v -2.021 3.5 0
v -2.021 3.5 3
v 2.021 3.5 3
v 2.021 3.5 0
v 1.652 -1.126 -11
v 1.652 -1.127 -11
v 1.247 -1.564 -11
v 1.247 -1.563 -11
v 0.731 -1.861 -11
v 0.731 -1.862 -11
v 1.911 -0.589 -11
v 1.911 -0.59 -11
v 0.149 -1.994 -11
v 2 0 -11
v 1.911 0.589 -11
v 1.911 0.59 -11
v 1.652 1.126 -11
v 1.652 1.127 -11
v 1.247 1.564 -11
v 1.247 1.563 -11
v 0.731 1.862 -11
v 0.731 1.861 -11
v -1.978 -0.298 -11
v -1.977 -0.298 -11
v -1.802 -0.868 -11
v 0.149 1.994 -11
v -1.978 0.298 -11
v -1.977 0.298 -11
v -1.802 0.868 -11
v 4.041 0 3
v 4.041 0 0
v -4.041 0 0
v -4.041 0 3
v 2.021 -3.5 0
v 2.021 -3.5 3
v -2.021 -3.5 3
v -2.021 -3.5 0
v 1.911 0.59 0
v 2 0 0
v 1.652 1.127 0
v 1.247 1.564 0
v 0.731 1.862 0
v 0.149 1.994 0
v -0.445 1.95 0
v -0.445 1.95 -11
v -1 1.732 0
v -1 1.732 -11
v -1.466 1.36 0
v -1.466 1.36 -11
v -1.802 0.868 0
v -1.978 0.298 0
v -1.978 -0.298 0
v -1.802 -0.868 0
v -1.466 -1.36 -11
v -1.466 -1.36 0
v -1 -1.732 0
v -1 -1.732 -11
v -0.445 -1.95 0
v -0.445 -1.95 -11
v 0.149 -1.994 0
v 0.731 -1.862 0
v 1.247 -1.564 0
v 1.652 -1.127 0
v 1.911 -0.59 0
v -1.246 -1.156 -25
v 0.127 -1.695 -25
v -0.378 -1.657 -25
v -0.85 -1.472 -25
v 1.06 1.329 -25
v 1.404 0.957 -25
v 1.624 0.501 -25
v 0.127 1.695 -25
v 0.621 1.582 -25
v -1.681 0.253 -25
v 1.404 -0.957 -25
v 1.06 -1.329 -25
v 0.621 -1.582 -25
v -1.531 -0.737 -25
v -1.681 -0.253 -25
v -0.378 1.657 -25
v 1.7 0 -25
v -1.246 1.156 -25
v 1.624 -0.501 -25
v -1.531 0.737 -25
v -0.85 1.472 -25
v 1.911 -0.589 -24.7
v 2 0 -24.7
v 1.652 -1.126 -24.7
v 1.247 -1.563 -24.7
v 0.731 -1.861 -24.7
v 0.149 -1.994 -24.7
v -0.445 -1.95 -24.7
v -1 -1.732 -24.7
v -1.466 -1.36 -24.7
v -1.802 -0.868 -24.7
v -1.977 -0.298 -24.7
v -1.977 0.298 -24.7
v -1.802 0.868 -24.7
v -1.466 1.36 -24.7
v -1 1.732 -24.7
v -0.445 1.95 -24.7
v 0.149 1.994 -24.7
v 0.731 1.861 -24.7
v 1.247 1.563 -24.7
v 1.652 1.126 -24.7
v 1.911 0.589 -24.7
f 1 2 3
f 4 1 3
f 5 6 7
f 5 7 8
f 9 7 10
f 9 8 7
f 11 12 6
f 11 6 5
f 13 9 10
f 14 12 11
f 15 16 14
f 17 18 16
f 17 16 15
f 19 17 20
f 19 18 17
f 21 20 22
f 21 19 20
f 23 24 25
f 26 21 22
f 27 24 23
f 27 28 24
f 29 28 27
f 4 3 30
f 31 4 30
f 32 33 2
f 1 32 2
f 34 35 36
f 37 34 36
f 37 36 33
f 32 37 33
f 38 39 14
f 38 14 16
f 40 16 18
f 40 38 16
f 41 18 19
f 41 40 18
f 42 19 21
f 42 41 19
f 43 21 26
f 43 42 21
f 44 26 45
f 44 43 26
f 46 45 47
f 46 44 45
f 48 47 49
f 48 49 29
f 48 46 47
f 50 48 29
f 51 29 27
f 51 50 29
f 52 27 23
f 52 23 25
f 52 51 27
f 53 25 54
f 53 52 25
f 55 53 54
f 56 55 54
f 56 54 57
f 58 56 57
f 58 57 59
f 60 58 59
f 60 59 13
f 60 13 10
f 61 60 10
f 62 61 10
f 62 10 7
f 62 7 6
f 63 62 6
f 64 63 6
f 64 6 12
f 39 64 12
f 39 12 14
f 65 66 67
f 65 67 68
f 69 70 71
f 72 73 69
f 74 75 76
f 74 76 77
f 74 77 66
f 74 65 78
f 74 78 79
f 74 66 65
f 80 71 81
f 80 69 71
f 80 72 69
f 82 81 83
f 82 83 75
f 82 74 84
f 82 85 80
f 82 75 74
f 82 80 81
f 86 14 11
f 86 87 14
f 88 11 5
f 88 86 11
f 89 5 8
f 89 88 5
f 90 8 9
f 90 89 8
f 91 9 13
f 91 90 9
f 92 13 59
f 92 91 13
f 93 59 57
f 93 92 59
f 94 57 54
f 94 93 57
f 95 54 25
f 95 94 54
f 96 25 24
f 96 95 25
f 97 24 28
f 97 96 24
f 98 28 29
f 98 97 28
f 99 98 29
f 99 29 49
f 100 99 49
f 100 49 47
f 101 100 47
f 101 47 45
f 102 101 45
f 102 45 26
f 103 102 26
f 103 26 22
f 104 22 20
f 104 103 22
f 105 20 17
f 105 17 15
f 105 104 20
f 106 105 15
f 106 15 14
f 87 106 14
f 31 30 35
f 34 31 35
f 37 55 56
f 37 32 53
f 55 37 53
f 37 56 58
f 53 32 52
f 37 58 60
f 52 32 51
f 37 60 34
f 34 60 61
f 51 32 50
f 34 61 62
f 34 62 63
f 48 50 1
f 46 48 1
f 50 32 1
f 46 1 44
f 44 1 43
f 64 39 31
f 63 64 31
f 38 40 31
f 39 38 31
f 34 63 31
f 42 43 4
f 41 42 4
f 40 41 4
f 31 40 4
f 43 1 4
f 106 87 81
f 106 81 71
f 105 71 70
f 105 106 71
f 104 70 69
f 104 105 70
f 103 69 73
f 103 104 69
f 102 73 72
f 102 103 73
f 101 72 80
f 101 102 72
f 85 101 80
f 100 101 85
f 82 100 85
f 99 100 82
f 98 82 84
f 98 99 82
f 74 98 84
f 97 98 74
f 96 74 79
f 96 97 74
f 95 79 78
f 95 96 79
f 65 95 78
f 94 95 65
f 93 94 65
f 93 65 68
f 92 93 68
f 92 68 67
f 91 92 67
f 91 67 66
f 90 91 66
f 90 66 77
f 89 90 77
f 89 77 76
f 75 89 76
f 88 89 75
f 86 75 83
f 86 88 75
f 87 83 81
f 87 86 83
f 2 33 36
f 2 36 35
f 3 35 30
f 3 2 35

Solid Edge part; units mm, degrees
sketch "Sketch1" plane through (0, 0, 0) normal (0, 0, 1) x (1, 0, 0)
  circle A0 centre (0, 0) radius 4.06
  dimension "D1" = 8.12
extrude "Protrusion1" add sketch "Sketch1" along normal blind 3
sketch "Sketch2" plane through (0, 0, 0) normal (0, 0, -1) x (1, 0, 0)
  circle A0 centre (0, 0) radius 2
extrude "Protrusion2" add sketch "Sketch2" along normal blind 25
sketch "Sketch3" plane through (0, 0, -25) normal (0, 0, -1) x (1, 0, 0)
  circle A0 centre (0, 0) radius 1.9997
extrude "Cutout1" cut sketch "Sketch3" against normal blind 14 flip side to cut
chamfer "Chamfer_1" distance 0.3 angle 45 1 edges at (-1.9997, 0, -25)
sketch "Sketch4" plane through (0, 0, 3) normal (0, 0, 1) x (1, 0, 0)
  line L0 (-2.0576, 3.5) -> (2.0576, 3.5)
  dimension "D1" = 7
extrude "Cutout2" cut sketch "Sketch4" against normal up to next material side at (0, 3.55, 3)
pattern_circular "Pattern1" count 6 over 360 about axis through (0, 0, 3) along (0, 0, 1) of "Cutout2"
properties part number "215862" material "Stainless Steel, 304"
